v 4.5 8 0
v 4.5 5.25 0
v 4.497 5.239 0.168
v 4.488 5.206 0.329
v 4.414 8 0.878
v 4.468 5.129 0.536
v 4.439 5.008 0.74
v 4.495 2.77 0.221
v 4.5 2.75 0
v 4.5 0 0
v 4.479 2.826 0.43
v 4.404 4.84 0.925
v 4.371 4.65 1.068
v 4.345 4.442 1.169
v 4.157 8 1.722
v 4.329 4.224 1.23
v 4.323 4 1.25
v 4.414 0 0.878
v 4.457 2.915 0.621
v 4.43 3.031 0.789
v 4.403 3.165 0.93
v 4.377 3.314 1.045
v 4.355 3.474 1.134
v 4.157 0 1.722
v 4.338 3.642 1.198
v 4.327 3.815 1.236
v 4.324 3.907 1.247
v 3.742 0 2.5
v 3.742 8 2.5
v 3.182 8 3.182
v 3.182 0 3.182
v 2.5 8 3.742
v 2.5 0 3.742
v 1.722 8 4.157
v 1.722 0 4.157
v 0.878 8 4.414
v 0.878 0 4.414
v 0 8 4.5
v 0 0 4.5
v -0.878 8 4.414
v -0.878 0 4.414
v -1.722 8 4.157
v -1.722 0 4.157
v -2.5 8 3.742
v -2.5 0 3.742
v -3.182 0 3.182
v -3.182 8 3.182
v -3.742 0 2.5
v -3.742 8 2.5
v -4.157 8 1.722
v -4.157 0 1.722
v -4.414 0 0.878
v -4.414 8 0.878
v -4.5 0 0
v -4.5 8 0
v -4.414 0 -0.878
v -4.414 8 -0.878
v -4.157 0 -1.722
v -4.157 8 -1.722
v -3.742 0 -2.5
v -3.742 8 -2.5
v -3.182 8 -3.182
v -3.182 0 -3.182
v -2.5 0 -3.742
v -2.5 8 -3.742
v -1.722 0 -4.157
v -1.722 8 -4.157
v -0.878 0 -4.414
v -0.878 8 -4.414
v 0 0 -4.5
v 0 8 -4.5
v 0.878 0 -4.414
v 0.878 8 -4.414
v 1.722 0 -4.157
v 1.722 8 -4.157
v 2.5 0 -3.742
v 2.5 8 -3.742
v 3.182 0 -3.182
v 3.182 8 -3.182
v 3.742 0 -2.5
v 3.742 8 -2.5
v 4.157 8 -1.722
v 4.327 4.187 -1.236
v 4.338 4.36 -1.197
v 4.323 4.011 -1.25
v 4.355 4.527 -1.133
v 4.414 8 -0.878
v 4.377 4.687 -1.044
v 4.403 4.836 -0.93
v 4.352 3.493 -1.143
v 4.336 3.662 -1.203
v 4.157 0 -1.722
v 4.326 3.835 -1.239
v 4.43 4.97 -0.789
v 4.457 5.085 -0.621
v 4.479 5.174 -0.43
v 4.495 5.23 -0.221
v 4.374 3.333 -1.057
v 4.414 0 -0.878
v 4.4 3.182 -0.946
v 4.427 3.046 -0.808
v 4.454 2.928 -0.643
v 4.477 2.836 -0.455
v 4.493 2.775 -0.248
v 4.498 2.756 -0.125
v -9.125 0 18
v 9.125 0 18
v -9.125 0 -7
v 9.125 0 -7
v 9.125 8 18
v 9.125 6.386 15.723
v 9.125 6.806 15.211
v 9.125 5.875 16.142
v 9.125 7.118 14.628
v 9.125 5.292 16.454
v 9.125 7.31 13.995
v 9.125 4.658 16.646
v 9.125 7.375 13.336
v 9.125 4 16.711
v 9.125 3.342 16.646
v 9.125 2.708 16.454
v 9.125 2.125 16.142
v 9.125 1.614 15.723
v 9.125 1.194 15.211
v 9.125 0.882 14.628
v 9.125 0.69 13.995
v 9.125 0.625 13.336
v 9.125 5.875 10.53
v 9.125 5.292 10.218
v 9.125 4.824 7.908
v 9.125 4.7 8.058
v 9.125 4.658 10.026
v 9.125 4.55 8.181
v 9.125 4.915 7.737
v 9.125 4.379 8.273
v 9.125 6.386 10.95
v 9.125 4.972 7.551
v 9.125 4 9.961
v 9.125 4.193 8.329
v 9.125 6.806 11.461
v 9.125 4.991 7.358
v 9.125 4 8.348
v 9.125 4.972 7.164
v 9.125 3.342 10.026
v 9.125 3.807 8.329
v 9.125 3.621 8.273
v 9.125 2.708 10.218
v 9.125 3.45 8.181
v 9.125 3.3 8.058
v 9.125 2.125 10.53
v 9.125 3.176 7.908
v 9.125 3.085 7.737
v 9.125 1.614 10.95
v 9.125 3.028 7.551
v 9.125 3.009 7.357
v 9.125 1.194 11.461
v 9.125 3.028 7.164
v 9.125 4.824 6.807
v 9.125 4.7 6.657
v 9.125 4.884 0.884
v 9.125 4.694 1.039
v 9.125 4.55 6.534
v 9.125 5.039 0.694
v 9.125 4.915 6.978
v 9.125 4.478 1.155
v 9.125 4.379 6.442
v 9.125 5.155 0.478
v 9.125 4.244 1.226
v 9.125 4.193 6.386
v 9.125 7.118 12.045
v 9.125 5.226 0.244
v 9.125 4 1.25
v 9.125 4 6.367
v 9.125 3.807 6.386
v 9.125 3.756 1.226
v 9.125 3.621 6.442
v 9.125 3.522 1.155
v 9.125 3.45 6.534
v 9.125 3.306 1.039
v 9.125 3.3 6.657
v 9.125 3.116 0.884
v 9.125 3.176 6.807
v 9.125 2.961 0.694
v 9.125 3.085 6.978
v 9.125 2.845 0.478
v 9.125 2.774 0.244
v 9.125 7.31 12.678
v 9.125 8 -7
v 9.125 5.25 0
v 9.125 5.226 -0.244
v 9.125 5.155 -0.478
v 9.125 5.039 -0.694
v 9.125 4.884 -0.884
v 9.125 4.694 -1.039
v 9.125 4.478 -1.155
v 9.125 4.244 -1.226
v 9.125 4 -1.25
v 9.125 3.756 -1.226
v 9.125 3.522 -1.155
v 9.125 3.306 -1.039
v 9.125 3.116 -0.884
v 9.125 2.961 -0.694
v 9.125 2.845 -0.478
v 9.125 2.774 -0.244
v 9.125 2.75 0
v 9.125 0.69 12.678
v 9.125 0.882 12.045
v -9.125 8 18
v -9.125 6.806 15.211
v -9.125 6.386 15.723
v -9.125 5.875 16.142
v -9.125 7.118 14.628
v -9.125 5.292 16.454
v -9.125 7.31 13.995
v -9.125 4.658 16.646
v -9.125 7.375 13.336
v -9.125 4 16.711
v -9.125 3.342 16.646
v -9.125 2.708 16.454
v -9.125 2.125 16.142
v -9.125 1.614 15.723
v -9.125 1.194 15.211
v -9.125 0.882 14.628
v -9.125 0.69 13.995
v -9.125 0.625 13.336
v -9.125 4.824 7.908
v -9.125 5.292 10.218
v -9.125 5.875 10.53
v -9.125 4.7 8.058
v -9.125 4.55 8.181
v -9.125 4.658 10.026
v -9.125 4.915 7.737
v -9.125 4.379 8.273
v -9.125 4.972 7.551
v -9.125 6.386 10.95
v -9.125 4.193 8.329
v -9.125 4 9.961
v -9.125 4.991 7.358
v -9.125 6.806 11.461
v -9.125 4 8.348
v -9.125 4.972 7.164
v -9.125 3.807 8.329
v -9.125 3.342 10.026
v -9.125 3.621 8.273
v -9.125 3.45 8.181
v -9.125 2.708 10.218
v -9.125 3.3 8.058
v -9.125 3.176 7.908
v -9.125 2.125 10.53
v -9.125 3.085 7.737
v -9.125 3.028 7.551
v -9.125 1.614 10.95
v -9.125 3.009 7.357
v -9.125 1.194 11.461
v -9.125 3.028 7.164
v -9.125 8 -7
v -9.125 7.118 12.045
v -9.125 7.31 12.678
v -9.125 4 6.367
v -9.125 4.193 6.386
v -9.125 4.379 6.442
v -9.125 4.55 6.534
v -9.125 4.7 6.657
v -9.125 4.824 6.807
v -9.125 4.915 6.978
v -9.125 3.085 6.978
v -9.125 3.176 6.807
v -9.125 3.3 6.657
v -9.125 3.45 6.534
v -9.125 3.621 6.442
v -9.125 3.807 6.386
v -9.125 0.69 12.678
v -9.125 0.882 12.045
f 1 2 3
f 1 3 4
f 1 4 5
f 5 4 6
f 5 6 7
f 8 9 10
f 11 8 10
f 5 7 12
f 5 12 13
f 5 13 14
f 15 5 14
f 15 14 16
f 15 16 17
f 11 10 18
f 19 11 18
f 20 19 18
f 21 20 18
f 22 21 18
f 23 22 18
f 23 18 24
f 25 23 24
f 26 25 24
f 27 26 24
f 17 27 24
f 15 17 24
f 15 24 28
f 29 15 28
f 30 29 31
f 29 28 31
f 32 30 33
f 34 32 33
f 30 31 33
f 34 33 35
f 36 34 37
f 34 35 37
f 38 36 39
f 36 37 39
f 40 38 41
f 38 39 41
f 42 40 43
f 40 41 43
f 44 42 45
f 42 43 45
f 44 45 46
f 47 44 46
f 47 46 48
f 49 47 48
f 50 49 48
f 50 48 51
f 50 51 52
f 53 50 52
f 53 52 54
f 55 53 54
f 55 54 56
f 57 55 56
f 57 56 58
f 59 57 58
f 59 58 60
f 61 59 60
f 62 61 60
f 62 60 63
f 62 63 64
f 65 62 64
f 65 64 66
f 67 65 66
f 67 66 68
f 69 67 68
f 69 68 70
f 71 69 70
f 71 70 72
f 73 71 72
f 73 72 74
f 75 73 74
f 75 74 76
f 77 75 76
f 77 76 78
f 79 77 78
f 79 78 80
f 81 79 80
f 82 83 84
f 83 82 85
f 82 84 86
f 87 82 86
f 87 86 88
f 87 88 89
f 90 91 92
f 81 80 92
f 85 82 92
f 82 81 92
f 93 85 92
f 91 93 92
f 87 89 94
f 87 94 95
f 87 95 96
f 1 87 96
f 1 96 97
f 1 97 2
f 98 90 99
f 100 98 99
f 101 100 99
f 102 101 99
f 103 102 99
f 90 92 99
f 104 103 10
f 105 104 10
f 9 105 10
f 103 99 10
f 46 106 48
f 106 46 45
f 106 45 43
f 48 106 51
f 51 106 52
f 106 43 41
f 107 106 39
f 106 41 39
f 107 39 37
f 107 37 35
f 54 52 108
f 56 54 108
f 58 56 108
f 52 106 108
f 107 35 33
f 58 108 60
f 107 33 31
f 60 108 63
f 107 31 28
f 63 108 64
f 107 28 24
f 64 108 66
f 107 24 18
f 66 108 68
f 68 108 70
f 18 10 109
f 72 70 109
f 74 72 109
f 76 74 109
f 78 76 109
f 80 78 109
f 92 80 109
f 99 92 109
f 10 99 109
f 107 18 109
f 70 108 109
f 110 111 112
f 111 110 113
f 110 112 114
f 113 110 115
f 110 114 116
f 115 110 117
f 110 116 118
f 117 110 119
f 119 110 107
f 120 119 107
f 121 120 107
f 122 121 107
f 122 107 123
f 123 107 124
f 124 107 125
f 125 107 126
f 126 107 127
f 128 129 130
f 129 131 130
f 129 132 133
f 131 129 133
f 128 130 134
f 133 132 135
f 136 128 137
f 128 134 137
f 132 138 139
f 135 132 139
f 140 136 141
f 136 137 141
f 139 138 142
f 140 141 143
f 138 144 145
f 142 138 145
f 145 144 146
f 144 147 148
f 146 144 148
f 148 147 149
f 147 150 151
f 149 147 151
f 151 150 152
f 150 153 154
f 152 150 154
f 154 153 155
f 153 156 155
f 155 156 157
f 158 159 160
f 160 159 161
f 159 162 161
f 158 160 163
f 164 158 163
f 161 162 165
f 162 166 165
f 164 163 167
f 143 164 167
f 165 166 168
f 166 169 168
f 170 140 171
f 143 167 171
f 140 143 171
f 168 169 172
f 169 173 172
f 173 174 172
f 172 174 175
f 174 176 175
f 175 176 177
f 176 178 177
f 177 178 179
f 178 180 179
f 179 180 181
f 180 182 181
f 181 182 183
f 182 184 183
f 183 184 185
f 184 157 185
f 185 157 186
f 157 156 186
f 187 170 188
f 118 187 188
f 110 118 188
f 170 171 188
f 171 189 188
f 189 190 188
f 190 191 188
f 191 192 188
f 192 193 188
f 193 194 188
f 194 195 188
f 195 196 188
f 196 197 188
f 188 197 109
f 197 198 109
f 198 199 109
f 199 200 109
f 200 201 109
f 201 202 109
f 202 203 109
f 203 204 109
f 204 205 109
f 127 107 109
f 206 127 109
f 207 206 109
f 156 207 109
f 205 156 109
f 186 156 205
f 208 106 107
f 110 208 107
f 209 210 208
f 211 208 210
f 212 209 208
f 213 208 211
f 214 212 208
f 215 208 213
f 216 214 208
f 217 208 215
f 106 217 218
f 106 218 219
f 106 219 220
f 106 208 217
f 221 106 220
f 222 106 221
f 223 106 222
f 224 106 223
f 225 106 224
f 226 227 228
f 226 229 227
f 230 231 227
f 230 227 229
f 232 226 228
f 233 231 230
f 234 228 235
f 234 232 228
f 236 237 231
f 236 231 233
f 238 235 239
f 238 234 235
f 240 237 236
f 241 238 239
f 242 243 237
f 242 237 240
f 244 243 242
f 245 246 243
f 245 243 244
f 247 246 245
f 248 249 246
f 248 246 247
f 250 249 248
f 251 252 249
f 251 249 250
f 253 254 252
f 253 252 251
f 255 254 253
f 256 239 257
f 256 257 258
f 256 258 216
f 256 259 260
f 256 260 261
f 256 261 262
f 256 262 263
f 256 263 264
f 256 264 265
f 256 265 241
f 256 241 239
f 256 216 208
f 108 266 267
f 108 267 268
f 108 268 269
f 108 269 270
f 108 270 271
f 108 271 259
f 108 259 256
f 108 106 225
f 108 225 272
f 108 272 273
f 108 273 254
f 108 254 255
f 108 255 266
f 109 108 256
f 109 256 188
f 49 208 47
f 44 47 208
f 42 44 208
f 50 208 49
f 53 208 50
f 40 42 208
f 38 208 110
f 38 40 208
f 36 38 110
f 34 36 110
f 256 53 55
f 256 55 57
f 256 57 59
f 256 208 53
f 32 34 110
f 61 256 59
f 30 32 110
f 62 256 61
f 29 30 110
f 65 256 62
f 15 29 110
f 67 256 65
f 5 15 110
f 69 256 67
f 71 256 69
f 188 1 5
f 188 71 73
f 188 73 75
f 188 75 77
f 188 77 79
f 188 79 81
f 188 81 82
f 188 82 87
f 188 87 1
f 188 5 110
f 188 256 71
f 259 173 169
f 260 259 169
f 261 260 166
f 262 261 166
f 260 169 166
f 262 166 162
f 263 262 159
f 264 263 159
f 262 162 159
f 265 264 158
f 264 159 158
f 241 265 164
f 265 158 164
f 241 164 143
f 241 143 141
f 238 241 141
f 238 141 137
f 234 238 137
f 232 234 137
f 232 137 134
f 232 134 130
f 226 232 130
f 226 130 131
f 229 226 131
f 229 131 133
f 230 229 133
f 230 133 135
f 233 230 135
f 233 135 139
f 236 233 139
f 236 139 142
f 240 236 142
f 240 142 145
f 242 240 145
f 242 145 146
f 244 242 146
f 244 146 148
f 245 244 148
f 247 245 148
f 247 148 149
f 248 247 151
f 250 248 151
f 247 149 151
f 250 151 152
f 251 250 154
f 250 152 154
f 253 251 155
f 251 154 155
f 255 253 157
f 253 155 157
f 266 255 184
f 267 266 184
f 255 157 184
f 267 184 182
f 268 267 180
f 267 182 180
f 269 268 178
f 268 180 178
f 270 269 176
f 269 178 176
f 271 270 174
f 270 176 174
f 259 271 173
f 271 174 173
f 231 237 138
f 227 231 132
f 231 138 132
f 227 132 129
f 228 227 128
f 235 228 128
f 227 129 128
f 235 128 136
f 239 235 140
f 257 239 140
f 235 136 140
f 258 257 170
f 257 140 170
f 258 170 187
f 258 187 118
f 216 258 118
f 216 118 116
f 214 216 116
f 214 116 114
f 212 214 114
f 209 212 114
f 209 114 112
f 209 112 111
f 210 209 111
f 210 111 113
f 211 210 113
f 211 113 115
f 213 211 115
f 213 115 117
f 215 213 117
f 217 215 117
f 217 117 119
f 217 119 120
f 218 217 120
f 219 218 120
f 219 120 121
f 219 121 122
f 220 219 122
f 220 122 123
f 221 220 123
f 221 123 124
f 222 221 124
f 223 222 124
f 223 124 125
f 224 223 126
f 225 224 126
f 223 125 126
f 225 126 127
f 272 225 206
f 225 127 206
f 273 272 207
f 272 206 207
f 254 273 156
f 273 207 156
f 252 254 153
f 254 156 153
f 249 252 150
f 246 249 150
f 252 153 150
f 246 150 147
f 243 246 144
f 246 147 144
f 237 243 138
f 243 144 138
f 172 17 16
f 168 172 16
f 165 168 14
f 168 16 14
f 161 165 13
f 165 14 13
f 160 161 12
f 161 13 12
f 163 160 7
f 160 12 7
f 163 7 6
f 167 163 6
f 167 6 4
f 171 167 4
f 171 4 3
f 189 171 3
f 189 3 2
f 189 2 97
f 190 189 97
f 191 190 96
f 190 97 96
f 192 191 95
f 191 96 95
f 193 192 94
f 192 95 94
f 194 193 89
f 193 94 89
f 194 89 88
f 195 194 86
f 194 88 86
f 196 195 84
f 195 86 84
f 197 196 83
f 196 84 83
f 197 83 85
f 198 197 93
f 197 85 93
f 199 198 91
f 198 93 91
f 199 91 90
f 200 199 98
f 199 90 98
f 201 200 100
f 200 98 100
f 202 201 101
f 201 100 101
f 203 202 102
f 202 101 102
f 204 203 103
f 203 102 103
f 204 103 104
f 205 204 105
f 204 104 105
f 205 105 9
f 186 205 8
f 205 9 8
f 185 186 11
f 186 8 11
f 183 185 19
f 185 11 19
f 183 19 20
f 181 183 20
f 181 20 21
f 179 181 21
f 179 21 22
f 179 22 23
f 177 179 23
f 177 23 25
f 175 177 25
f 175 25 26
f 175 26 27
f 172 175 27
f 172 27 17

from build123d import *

# Parameters (mm, degrees)
SKETCH1_W                 = 18.25
SKETCH1_H                 = 25
BOSS_EXTRUDE1_DEPTH       = 8
M10X1_0_TAPPED_HOLE1_D    = 9
SKETCH7_R                 = 3.375
SKETCH7_R_2               = 0.9906
CUT_EXTRUDE2_DEPTH        = 19.25
M3X0_5_TAPPED_HOLE1_D     = 2.5
M3X0_5_TAPPED_HOLE1_DEPTH = 6.35
M3X0_5_TAPPED_HOLE1_TIP   = 0.751075774


with BuildPart() as part:
    # Sketch1 → Boss-Extrude1 (new body)
    with BuildSketch(Plane(origin=(0, 0, 0), x_dir=(1, 0, 0), z_dir=(0, 1, 0))):
        with Locations((0, -5.5)):
            Rectangle(SKETCH1_W, SKETCH1_H)
    extrude(amount=BOSS_EXTRUDE1_DEPTH)

    # M10x1.0 Tapped Hole1 (through all)
    with Locations(Plane(origin=(0, 8, 0), x_dir=(-1, 0, 0), z_dir=(0, 1, 0))):
        with Locations((0, 0)):
            Hole(M10X1_0_TAPPED_HOLE1_D / 2)

    # Sketch7 → Cut-Extrude2 (cut, through all)
    with BuildSketch(Plane(origin=(9.125, 0, 0), x_dir=(0, 0, -1), z_dir=(1, 0, 0))):
        with Locations((-13.336186812, 4)):
            Circle(SKETCH7_R)
        with Locations((-7.3575, 4)):
            Circle(SKETCH7_R_2)
    extrude(amount=-CUT_EXTRUDE2_DEPTH, mode=Mode.SUBTRACT)

    # M3x0.5 Tapped Hole1
    with Locations(Plane(origin=(9.125, 0, 0), x_dir=(0, 0, -1), z_dir=(1, 0, 0))):
        with Locations((0, 4)):
            Hole(M3X0_5_TAPPED_HOLE1_D / 2, depth=M3X0_5_TAPPED_HOLE1_DEPTH)
            with Locations((0, 0, -(M3X0_5_TAPPED_HOLE1_DEPTH + M3X0_5_TAPPED_HOLE1_TIP / 2))):  # 118° drill point
                Cone(0, M3X0_5_TAPPED_HOLE1_D / 2, M3X0_5_TAPPED_HOLE1_TIP, mode=Mode.SUBTRACT)


solid = part.part
